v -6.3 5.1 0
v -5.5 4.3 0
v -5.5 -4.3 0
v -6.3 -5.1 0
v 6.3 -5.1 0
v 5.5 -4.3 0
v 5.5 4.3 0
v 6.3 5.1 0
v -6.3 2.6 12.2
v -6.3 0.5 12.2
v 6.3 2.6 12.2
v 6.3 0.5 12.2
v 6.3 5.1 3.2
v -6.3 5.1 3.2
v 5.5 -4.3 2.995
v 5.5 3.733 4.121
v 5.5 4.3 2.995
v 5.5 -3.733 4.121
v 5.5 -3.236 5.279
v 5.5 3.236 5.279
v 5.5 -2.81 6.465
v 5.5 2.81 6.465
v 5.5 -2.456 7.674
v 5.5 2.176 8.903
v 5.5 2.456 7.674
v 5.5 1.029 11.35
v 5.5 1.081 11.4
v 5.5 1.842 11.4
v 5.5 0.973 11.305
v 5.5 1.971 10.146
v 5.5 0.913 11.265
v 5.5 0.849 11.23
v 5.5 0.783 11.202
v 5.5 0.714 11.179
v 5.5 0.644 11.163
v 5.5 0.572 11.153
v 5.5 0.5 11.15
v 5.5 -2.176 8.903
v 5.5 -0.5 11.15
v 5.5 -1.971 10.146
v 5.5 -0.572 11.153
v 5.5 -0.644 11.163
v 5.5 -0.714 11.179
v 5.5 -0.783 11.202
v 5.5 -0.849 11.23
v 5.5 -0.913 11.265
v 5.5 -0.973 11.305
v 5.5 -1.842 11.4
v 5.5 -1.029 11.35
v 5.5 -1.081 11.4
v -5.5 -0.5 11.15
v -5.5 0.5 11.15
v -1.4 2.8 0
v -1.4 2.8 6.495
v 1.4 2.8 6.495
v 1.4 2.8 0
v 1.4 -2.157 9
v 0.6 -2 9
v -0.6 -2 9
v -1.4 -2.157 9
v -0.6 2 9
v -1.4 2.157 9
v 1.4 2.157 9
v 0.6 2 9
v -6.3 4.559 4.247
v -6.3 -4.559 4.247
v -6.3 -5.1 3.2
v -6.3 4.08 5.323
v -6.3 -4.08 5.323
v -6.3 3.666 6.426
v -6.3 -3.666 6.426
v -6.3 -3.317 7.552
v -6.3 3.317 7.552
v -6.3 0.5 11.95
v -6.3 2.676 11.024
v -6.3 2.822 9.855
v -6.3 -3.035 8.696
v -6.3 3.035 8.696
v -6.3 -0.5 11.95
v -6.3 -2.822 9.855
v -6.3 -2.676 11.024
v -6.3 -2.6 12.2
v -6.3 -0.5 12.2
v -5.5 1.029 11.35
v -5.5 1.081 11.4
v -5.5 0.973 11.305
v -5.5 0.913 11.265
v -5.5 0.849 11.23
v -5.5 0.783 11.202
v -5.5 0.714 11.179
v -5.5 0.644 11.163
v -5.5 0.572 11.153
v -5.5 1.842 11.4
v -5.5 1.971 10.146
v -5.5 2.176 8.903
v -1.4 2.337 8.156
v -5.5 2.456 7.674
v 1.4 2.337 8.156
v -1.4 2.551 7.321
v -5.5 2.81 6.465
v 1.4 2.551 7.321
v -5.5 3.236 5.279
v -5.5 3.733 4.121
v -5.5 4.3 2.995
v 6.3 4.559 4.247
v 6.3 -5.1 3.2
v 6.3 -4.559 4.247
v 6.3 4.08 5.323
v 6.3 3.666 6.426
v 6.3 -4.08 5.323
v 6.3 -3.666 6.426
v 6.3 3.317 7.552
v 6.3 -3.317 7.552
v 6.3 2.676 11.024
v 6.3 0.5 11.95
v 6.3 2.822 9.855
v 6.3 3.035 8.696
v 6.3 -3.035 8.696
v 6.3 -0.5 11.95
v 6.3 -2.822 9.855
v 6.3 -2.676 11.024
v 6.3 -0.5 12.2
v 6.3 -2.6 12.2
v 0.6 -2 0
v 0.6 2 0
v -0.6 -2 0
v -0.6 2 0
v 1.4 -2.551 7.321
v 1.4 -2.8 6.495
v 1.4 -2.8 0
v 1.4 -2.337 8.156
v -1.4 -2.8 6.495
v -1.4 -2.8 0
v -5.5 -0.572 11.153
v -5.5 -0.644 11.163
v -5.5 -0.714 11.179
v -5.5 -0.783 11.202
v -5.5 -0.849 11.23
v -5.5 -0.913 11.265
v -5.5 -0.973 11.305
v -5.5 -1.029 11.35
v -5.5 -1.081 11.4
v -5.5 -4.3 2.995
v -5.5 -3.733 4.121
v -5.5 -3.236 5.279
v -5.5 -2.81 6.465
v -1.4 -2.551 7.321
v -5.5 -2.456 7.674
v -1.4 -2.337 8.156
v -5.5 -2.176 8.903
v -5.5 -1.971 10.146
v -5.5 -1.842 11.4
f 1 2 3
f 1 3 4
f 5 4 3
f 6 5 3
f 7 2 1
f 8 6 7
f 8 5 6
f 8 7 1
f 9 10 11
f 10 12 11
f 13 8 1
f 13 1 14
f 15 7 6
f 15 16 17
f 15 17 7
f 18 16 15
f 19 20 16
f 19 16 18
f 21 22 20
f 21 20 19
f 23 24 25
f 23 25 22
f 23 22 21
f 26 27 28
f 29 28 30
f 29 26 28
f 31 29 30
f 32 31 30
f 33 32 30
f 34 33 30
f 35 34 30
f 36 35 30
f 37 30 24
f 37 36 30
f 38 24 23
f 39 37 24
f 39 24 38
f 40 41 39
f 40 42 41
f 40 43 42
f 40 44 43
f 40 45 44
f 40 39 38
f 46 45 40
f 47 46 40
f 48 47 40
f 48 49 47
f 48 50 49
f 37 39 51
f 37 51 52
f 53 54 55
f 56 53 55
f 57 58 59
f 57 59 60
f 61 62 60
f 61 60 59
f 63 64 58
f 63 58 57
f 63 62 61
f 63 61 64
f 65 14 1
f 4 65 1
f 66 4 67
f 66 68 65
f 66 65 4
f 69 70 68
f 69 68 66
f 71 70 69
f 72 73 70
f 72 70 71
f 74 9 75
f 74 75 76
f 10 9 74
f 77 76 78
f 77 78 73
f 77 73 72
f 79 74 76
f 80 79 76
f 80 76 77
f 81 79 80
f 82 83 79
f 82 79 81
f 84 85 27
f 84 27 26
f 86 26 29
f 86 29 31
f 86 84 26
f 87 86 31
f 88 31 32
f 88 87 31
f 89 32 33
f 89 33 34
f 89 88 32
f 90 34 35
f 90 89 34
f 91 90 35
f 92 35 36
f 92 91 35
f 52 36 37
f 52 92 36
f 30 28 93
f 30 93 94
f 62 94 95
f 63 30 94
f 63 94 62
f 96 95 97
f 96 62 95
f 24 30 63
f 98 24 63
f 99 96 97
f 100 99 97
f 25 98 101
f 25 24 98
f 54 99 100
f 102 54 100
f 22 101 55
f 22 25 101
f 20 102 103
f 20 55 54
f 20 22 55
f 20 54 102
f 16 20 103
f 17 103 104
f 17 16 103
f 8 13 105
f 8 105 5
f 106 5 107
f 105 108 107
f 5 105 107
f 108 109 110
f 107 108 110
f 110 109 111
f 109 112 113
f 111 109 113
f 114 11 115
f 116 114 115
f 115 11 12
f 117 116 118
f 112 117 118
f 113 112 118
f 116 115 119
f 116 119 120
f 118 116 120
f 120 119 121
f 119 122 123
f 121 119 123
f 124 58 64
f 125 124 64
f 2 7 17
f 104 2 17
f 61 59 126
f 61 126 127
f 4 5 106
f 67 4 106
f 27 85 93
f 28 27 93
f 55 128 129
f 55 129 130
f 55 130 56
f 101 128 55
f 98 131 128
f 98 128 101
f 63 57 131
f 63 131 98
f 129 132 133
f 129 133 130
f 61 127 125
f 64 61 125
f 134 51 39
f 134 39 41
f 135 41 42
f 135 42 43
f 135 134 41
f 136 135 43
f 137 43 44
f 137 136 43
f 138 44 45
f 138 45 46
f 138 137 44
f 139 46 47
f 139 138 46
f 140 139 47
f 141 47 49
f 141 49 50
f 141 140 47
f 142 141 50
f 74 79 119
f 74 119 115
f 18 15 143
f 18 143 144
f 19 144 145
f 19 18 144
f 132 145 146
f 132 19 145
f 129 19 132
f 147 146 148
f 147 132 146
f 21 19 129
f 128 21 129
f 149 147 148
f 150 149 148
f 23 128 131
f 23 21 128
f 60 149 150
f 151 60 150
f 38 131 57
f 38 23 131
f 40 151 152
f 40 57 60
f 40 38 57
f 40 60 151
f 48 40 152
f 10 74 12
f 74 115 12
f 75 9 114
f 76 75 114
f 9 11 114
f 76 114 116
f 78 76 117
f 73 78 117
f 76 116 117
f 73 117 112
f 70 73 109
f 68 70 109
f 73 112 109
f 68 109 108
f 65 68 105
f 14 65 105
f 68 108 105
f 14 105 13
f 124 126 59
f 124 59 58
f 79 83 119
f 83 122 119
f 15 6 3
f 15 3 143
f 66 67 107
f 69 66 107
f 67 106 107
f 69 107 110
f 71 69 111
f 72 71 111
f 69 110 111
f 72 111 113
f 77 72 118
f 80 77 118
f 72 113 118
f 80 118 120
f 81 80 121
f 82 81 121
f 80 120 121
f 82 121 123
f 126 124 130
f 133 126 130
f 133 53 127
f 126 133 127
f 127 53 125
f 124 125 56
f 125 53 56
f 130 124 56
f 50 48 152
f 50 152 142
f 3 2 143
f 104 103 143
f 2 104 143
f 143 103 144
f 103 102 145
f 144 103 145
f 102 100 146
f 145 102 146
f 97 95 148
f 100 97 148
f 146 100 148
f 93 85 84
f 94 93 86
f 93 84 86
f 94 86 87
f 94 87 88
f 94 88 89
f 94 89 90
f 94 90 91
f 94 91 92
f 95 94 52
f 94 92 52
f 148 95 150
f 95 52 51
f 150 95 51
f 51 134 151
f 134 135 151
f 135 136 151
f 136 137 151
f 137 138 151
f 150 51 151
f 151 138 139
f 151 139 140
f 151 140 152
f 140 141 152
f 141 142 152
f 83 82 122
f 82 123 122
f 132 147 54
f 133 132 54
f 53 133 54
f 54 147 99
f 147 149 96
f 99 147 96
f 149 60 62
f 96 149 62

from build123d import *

# Parameters (mm, degrees)
PAD_DEPTH     = 6.3
THICKNESS_T   = -0.8
SKETCH001_W   = 2.8
SKETCH001_H   = 5.6
SKETCH001_W_2 = 1.2
SKETCH001_H_2 = 4
PAD001_DEPTH  = 9


with BuildPart() as part:
    # Sketch → Pad (new body, symmetric)
    with BuildSketch(Plane.YZ):
        with BuildLine():
            Line((-5.1, 0), (-5.1, 3.2))
            ThreePointArc((-5.1, 3.2), (-3.317216, 7.552005), (-2.6, 12.2))
            Line((-2.6, 12.2), (-0.5, 12.2))
            Line((-0.5, 12.2), (-0.5, 11.95))
            Line((-0.5, 11.95), (0.5, 11.95))
            Line((0.5, 11.95), (0.5, 12.2))
            Line((0.5, 12.2), (2.6, 12.2))
            ThreePointArc((2.6, 12.2), (3.317216, 7.552005), (5.1, 3.2))
            Line((5.1, 0), (5.1, 3.2))
            Line((-5.1, 0), (5.1, 0))
        make_face()
    extrude(amount=PAD_DEPTH, both=True)

    # Thickness
    thickness_openings = [part.faces().sort_by_distance(p)[0] for p in [
        (0, 0, 0),
    ]]
    offset(amount=THICKNESS_T, openings=thickness_openings)

    # Sketch001 → Pad001 (join)
    with BuildSketch(Plane.XY.offset(9)):
        Rectangle(SKETCH001_W, SKETCH001_H)
        Rectangle(SKETCH001_W_2, SKETCH001_H_2, mode=Mode.SUBTRACT)
    extrude(amount=-PAD001_DEPTH)


solid = part.part
